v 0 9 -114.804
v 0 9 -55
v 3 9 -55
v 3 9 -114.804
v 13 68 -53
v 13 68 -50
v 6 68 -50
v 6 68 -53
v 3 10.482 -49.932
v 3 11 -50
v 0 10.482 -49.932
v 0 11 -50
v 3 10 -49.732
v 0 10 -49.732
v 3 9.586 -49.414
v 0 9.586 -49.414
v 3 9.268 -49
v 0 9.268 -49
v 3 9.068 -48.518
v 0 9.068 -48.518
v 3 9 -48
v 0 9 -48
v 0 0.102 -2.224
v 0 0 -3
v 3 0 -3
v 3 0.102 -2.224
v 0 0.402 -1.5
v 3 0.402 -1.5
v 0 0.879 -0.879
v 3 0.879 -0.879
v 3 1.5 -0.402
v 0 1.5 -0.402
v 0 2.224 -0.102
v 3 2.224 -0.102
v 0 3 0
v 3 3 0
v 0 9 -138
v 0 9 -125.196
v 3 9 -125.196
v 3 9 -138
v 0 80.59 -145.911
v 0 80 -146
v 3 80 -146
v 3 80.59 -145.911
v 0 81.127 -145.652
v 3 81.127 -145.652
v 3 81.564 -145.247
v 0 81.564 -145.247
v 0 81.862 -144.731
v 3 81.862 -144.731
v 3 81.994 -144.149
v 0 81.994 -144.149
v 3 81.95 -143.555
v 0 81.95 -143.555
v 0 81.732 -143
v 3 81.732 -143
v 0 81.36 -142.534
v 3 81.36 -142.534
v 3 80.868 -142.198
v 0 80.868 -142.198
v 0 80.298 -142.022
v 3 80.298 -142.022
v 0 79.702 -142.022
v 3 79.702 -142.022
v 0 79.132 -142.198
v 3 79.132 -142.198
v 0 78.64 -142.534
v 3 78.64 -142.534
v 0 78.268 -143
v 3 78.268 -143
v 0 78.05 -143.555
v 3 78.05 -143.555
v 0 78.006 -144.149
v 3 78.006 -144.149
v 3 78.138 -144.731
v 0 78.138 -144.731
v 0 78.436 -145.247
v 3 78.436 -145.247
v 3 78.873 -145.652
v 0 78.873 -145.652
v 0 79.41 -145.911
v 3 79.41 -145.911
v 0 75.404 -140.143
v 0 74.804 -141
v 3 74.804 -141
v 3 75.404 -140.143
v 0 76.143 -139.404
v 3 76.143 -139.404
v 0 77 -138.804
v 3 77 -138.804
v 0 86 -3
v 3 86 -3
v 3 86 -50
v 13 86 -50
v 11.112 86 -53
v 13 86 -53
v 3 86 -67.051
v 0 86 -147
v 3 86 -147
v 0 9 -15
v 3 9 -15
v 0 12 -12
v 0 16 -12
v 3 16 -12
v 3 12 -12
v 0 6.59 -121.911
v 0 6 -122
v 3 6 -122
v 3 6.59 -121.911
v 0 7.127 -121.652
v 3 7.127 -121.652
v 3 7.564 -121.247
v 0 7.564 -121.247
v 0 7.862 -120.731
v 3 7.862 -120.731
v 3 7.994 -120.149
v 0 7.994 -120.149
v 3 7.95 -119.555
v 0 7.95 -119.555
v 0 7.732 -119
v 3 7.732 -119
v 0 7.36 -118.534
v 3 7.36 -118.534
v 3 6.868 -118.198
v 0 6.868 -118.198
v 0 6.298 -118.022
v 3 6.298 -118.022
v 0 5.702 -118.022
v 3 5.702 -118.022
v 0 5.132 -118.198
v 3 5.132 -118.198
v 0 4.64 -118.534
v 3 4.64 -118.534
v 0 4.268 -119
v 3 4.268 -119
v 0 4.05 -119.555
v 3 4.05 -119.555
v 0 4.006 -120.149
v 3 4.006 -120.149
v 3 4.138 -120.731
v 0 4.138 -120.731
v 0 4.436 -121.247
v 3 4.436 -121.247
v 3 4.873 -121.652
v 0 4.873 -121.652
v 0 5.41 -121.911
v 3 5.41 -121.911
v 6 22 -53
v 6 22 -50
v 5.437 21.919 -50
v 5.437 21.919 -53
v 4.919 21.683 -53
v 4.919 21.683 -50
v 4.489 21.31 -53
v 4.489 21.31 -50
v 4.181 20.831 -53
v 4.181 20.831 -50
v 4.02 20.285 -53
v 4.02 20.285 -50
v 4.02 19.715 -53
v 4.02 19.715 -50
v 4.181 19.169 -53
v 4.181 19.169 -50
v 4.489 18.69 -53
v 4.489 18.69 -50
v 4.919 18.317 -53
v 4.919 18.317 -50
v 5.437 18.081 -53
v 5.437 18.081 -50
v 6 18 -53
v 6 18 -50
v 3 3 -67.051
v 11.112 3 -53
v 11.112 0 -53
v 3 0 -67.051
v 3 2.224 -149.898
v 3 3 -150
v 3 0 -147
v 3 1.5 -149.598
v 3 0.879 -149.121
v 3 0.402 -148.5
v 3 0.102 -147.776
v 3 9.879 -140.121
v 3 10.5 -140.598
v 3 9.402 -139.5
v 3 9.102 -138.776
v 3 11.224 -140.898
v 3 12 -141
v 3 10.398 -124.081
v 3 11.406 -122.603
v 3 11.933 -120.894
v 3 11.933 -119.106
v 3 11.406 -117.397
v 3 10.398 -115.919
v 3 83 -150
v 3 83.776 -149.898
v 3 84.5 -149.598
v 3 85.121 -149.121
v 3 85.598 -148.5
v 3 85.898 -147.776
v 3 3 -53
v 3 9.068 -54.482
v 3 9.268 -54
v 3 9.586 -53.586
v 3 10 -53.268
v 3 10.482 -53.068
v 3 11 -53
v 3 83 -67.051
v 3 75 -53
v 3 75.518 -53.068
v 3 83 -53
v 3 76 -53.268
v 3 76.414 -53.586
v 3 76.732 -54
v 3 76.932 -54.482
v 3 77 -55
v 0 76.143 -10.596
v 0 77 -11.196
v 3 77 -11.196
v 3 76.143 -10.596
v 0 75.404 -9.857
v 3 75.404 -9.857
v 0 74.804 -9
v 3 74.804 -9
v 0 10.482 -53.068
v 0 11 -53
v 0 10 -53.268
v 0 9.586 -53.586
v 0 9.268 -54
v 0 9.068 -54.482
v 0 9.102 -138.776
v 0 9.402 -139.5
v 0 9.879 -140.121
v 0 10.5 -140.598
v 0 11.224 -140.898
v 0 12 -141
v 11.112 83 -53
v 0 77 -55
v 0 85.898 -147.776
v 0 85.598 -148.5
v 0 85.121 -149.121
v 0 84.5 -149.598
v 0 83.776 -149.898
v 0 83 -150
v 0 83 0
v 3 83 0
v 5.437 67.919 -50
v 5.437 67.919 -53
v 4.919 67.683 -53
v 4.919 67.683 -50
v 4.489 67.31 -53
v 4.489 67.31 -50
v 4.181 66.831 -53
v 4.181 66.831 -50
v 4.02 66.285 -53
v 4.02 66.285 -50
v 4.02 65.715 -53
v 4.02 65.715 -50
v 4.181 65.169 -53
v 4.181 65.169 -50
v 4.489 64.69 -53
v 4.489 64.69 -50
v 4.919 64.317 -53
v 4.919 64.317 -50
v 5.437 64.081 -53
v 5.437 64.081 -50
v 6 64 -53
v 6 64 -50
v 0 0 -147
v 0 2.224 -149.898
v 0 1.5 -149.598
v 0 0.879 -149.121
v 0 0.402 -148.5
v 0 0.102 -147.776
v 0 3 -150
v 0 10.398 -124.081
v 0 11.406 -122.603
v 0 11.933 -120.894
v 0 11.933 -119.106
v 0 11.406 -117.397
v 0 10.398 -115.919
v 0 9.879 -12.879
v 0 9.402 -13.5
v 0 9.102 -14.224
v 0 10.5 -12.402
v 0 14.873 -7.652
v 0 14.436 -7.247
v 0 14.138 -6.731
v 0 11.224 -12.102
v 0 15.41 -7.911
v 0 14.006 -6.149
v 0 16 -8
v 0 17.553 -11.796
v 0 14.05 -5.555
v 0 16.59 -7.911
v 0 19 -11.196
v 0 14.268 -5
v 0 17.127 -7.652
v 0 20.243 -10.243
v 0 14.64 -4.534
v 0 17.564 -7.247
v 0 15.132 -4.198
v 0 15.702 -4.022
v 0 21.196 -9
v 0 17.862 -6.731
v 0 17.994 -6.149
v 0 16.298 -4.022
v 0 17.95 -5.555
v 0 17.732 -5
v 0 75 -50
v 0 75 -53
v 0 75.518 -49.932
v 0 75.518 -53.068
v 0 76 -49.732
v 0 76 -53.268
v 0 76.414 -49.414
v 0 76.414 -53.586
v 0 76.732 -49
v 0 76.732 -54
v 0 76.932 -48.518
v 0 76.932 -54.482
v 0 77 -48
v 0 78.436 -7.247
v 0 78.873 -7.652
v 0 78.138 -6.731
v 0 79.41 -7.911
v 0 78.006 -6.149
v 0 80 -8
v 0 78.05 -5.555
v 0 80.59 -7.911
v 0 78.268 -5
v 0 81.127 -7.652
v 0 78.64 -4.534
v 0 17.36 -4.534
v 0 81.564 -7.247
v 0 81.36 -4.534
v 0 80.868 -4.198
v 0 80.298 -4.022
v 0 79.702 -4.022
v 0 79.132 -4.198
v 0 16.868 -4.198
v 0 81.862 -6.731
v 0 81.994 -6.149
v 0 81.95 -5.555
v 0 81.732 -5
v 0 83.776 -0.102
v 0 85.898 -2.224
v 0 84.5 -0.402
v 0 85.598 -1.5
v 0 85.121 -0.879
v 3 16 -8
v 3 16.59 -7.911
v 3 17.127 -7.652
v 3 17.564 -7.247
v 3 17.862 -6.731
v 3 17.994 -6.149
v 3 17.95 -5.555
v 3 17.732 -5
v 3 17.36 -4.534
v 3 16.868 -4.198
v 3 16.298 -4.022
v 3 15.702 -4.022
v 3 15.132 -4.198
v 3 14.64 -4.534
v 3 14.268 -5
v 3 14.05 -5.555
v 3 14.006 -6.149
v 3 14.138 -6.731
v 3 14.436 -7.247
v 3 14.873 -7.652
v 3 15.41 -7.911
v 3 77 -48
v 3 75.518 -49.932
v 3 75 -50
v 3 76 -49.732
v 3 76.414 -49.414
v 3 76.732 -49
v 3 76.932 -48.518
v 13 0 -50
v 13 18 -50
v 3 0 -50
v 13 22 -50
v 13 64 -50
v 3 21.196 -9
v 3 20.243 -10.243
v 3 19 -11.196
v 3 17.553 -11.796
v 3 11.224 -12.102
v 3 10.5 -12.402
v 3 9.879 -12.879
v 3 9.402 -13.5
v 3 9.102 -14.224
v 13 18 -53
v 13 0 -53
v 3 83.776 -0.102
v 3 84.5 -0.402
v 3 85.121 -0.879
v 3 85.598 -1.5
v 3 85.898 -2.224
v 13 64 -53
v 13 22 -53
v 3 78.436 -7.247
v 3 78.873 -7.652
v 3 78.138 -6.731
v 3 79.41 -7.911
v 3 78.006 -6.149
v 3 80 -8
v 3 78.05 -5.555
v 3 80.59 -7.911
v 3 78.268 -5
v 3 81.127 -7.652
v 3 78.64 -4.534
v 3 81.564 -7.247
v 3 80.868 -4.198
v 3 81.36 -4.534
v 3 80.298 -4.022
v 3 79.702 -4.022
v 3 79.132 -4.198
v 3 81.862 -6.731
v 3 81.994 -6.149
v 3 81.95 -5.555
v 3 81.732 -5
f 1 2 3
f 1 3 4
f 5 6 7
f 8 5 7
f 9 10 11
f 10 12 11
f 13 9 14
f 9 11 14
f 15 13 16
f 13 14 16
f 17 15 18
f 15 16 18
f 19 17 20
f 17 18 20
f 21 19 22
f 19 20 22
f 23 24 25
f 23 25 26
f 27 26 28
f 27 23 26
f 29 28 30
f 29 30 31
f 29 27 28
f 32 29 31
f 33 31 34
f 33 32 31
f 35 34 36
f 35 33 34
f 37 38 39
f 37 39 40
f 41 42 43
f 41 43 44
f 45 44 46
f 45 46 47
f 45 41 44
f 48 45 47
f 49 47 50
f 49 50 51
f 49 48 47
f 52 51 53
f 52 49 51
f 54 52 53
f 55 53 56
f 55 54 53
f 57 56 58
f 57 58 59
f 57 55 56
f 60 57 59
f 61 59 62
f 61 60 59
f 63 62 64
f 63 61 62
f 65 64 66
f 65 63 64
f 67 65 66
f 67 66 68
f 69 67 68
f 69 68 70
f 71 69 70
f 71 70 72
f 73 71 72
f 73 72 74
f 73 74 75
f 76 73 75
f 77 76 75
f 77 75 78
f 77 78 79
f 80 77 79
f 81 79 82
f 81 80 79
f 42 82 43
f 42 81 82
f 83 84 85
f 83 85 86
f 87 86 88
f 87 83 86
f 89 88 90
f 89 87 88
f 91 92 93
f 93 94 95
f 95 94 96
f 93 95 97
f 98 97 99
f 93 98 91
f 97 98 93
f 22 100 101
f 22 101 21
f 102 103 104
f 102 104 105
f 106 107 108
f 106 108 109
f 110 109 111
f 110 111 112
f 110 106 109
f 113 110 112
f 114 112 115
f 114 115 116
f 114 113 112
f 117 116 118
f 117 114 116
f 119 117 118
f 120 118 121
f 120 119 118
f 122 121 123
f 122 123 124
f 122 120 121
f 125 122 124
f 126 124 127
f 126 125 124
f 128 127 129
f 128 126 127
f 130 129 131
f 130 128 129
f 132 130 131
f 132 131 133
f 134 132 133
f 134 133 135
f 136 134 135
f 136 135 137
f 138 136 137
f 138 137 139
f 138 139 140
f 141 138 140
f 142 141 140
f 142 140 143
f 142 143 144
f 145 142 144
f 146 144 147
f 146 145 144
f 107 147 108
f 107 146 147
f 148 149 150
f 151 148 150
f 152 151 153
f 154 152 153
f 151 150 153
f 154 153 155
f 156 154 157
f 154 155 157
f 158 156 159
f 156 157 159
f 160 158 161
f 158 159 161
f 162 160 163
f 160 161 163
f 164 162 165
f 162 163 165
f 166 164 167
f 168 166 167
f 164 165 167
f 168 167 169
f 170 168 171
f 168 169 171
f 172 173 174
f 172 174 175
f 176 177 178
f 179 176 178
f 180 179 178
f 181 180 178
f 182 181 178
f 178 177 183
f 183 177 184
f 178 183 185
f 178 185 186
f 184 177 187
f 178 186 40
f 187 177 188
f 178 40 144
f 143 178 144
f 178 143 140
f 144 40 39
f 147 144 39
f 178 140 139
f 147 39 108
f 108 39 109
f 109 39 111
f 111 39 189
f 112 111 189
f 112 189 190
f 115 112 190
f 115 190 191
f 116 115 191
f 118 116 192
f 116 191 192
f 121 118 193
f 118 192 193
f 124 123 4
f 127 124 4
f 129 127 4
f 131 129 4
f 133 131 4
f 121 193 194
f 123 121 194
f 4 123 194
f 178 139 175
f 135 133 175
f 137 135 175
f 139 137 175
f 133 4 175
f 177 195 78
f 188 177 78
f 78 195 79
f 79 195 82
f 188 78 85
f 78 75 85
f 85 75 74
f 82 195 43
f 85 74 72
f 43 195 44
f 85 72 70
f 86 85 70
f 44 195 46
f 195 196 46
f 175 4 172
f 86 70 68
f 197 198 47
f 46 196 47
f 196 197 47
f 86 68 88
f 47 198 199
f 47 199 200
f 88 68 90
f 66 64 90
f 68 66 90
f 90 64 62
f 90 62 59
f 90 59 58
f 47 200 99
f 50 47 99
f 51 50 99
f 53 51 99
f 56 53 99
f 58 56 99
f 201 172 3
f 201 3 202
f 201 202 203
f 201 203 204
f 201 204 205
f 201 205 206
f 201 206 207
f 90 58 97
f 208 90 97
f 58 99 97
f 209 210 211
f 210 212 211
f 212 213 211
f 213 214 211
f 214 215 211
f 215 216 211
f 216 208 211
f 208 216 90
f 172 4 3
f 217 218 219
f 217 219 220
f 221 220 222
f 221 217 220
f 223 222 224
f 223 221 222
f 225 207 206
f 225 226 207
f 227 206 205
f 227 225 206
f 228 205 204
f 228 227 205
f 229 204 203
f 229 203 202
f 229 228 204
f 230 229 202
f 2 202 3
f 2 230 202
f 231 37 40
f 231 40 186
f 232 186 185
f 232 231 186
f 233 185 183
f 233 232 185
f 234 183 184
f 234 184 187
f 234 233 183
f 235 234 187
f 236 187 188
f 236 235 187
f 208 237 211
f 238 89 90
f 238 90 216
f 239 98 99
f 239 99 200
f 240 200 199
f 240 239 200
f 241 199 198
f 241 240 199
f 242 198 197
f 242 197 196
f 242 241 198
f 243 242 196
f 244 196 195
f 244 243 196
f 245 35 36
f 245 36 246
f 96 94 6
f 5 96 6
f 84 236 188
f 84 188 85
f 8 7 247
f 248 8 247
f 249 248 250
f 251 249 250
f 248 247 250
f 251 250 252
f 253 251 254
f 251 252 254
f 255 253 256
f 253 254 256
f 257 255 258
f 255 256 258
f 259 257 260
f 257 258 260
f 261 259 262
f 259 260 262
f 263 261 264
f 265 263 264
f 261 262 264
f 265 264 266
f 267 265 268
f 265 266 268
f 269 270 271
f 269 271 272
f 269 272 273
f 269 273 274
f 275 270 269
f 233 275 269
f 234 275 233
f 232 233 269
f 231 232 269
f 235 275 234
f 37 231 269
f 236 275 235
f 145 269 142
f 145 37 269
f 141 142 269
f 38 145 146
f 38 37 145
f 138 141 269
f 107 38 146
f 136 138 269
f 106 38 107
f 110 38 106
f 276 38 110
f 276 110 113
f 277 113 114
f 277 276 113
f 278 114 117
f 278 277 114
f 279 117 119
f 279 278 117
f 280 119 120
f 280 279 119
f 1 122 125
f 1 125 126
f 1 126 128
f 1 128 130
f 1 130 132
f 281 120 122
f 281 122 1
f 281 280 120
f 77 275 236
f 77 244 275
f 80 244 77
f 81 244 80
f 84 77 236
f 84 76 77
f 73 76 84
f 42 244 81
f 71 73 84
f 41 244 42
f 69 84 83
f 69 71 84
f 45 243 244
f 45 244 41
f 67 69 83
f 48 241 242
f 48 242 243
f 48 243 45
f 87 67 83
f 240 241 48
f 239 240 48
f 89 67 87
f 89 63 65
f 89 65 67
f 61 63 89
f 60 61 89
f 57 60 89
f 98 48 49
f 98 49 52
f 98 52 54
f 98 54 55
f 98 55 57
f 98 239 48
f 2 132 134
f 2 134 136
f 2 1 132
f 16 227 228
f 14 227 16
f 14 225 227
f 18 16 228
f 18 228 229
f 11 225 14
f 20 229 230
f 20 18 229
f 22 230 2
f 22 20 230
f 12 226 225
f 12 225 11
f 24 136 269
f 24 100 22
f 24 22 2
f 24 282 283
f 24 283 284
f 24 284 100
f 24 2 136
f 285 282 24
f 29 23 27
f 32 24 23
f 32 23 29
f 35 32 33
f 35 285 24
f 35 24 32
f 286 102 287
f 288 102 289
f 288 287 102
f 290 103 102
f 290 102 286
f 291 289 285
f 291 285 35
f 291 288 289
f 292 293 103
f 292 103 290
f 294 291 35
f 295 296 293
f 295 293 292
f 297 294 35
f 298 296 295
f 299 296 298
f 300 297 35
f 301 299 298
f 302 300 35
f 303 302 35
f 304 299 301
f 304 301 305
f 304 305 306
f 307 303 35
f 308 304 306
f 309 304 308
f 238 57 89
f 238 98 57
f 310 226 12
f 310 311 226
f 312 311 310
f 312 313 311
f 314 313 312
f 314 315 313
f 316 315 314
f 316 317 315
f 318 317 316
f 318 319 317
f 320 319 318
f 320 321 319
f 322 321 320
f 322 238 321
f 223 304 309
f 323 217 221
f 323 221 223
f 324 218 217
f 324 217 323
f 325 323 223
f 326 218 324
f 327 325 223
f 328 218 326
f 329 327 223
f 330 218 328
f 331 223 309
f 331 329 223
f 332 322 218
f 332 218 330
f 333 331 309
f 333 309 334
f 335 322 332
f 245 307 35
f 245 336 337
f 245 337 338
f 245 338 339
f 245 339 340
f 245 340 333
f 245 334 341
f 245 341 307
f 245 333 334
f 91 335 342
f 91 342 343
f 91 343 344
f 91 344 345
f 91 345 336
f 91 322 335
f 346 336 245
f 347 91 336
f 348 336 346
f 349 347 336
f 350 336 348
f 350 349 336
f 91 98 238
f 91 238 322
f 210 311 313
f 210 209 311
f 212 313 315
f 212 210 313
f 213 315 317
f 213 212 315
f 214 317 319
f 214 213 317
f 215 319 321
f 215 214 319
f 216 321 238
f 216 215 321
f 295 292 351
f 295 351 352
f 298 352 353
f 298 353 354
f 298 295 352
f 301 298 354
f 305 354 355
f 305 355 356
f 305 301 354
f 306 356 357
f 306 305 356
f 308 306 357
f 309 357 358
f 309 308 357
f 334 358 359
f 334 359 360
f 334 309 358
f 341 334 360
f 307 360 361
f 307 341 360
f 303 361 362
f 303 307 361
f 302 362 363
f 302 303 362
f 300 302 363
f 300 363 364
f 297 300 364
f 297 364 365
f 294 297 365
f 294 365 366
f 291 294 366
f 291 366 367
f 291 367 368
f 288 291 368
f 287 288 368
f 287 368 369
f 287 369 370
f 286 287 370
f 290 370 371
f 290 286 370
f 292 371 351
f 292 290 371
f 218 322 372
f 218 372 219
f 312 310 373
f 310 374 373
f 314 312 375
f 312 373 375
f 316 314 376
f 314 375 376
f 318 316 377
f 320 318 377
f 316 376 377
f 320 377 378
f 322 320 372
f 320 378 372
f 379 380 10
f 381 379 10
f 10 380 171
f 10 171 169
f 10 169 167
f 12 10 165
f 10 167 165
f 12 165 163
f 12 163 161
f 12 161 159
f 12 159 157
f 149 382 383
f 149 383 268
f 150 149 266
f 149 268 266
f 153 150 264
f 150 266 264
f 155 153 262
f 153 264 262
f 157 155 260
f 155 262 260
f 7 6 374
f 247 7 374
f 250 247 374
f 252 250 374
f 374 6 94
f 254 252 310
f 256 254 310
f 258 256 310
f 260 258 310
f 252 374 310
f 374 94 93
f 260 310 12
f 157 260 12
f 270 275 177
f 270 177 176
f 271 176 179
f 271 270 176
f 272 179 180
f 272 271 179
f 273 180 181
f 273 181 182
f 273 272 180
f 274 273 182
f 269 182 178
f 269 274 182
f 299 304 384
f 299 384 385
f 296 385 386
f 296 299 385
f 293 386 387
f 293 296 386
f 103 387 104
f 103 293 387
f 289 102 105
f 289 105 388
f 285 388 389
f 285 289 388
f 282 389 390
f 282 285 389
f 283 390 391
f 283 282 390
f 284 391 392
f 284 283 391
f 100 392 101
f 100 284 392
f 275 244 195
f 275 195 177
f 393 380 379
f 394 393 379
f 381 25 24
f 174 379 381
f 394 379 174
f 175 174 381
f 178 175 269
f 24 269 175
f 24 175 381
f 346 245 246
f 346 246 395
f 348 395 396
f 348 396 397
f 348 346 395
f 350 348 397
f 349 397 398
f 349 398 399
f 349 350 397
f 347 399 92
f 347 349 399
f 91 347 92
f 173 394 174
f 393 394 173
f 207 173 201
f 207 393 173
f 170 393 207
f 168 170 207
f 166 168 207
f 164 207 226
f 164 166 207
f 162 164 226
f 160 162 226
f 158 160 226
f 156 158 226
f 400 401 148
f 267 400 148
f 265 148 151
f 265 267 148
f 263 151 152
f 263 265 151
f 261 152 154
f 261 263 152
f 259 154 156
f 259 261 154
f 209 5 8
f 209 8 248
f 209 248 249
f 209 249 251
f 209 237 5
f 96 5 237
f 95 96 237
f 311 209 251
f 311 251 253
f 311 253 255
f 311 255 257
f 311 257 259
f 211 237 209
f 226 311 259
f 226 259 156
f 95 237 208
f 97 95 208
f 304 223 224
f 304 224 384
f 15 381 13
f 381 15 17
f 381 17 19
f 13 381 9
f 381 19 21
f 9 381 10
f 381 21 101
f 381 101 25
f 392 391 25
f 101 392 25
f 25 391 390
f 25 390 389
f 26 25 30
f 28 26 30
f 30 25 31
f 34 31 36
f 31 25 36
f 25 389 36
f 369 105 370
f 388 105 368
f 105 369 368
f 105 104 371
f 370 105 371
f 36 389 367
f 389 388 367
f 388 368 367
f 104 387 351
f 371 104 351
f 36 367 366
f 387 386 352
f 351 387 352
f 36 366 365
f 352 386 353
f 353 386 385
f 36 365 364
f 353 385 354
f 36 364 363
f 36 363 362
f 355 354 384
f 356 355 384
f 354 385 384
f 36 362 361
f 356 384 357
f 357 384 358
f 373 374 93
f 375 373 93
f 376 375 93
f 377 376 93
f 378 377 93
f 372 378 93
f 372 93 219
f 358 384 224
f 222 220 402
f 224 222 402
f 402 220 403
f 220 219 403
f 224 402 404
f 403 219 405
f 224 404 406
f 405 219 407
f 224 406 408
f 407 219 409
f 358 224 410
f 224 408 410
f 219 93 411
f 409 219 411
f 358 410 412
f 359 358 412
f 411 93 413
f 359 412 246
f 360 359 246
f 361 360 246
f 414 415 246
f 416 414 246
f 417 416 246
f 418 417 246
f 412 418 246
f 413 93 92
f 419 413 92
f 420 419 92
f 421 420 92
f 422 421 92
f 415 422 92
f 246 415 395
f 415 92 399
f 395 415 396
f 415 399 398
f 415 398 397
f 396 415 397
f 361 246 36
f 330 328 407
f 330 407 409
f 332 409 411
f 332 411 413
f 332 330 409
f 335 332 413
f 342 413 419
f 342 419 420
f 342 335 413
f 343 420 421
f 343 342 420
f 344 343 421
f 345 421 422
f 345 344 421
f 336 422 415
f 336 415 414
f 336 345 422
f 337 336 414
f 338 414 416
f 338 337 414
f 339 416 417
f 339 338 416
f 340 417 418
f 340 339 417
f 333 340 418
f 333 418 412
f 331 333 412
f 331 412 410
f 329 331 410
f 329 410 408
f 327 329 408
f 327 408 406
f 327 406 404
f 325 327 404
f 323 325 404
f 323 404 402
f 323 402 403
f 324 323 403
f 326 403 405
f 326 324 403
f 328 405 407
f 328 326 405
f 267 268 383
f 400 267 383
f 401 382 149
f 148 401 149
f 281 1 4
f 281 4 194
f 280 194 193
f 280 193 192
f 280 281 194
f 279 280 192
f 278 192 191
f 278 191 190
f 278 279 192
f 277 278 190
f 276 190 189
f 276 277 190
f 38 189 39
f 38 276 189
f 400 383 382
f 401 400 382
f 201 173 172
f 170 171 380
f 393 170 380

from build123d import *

# Parameters (mm, degrees)
SKETCH_1_R      = 2
EXTRUDE_1_DEPTH = 3
EXTRUDE_2_DEPTH = 3
RIB_6_REACH     = 175.393
SKETCH_4_WALL_W = 365.010042788
SKETCH_4_WALL_H = 3
RIB_7_REACH     = 175.393
SKETCH_5_WALL_W = 365.010042788
SKETCH_5_WALL_H = 3
FILLET_1_R      = 2


with BuildPart() as part:
    # Эскиз1 → Бобышка-Вытянуть1 (new body)
    with BuildSketch(Plane(origin=(0, 0, 0), x_dir=(0, 0, -1), z_dir=(1, 0, 0))):
        with BuildLine():
            Line((0, 3), (0, 83))
            ThreePointArc((0, 83), (0.878679656, 85.121320344), (3, 86))
            Line((3, 86), (147, 86))
            ThreePointArc((147, 86), (149.121320344, 85.121320344), (150, 83))
            Line((150, 83), (150, 3))
            ThreePointArc((150, 3), (149.121320344, 0.878679656), (147, 0))
            Line((147, 0), (3, 0))
            ThreePointArc((3, 0), (0.878679656, 0.878679656), (0, 3))
        make_face()
        with Locations((6, 80)):
            Circle(SKETCH_1_R, mode=Mode.SUBTRACT)
        with Locations((144, 80)):
            Circle(SKETCH_1_R, mode=Mode.SUBTRACT)
        with Locations((120, 6)):
            Circle(SKETCH_1_R, mode=Mode.SUBTRACT)
        with Locations((6, 16)):
            Circle(SKETCH_1_R, mode=Mode.SUBTRACT)
        with BuildLine():
            Line((9, 74.803847577), (9, 21.196152423))
            ThreePointArc((9, 21.196152423), (11.196152423, 19), (12, 16))
            Line((12, 16), (12, 12))
            ThreePointArc((12, 12), (12.878679656, 9.878679656), (15, 9))
            Line((15, 9), (114.803847577, 9))
            ThreePointArc((114.803847577, 9), (120, 12), (125.196152423, 9))
            Line((125.196152423, 9), (138, 9))
            ThreePointArc((138, 9), (140.121320344, 9.878679656), (141, 12))
            Line((141, 12), (141, 74.803847577))
            ThreePointArc((141, 74.803847577), (139.757359313, 75.757359313), (138.803847577, 77))
            Line((138.803847577, 77), (11.196152423, 77))
            ThreePointArc((11.196152423, 77), (10.242640687, 75.757359313), (9, 74.803847577))
        make_face(mode=Mode.SUBTRACT)
    extrude(amount=EXTRUDE_1_DEPTH)

    # Эскиз2 → Бобышка-Вытянуть2 (add)
    with BuildSketch(Plane(origin=(0, 0, -50), x_dir=(-1, 0, 0), z_dir=(0, 0, -1))):
        with BuildLine():
            Line((0, 86), (-13, 86))
            Line((-13, 86), (-13, 68))
            Line((-13, 68), (-6, 68))
            ThreePointArc((-6, 68), (-4, 66), (-6, 64))
            Line((-6, 64), (-13, 64))
            Line((-13, 64), (-13, 22))
            Line((-13, 22), (-6, 22))
            ThreePointArc((-6, 22), (-4, 20), (-6, 18))
            Line((-6, 18), (-13, 18))
            Line((-13, 18), (-13, 0))
            Line((-13, 0), (0, 0))
            Line((0, 0), (0, 86))
        make_face()
    extrude(amount=EXTRUDE_2_DEPTH)

    # Эскиз4 wall → Ребро6 (add, up to next)
    with BuildSketch(Plane(origin=(7.056201664, 86, -60.025547367), x_dir=(-0.499999999996, 0, -0.866025403787), z_dir=(-0.866025403787, 0, 0.499999999996)), mode=Mode.PRIVATE) as rib_6_sk1:
        with Locations((0, 1.5)):
            Rectangle(SKETCH_4_WALL_W, SKETCH_4_WALL_H)
    rib_6_tool1 = extrude(rib_6_sk1.sketch, amount=RIB_6_REACH, mode=Mode.PRIVATE) - part.part
    add(rib_6_tool1.solids().sort_by_distance((7.056201664, 86, -60.025547367))[0])

    # Эскиз5 wall → Ребро7 (add, up to next)
    with BuildSketch(Plane(origin=(7.056201664, 0, -60.025547367), x_dir=(-0.499999999996, 0, -0.866025403787), z_dir=(0.866025403787, 0, -0.499999999996)), mode=Mode.PRIVATE) as rib_7_sk1:
        with Locations((0, 1.5)):
            Rectangle(SKETCH_5_WALL_W, SKETCH_5_WALL_H)
    rib_7_tool1 = extrude(rib_7_sk1.sketch, amount=-RIB_7_REACH, mode=Mode.PRIVATE) - part.part
    add(rib_7_tool1.solids().sort_by_distance((7.056201664, 0, -60.025547367))[0])

    # Скругление1
    fillet_1_edges = [part.edges().sort_by_distance(p)[0] for p in [
        (1.5, 77, -50),
        (1.5, 77, -53),
        (1.5, 9, -50),
        (1.5, 9, -53),
    ]]
    fillet(fillet_1_edges, radius=FILLET_1_R)


solid = part.part
